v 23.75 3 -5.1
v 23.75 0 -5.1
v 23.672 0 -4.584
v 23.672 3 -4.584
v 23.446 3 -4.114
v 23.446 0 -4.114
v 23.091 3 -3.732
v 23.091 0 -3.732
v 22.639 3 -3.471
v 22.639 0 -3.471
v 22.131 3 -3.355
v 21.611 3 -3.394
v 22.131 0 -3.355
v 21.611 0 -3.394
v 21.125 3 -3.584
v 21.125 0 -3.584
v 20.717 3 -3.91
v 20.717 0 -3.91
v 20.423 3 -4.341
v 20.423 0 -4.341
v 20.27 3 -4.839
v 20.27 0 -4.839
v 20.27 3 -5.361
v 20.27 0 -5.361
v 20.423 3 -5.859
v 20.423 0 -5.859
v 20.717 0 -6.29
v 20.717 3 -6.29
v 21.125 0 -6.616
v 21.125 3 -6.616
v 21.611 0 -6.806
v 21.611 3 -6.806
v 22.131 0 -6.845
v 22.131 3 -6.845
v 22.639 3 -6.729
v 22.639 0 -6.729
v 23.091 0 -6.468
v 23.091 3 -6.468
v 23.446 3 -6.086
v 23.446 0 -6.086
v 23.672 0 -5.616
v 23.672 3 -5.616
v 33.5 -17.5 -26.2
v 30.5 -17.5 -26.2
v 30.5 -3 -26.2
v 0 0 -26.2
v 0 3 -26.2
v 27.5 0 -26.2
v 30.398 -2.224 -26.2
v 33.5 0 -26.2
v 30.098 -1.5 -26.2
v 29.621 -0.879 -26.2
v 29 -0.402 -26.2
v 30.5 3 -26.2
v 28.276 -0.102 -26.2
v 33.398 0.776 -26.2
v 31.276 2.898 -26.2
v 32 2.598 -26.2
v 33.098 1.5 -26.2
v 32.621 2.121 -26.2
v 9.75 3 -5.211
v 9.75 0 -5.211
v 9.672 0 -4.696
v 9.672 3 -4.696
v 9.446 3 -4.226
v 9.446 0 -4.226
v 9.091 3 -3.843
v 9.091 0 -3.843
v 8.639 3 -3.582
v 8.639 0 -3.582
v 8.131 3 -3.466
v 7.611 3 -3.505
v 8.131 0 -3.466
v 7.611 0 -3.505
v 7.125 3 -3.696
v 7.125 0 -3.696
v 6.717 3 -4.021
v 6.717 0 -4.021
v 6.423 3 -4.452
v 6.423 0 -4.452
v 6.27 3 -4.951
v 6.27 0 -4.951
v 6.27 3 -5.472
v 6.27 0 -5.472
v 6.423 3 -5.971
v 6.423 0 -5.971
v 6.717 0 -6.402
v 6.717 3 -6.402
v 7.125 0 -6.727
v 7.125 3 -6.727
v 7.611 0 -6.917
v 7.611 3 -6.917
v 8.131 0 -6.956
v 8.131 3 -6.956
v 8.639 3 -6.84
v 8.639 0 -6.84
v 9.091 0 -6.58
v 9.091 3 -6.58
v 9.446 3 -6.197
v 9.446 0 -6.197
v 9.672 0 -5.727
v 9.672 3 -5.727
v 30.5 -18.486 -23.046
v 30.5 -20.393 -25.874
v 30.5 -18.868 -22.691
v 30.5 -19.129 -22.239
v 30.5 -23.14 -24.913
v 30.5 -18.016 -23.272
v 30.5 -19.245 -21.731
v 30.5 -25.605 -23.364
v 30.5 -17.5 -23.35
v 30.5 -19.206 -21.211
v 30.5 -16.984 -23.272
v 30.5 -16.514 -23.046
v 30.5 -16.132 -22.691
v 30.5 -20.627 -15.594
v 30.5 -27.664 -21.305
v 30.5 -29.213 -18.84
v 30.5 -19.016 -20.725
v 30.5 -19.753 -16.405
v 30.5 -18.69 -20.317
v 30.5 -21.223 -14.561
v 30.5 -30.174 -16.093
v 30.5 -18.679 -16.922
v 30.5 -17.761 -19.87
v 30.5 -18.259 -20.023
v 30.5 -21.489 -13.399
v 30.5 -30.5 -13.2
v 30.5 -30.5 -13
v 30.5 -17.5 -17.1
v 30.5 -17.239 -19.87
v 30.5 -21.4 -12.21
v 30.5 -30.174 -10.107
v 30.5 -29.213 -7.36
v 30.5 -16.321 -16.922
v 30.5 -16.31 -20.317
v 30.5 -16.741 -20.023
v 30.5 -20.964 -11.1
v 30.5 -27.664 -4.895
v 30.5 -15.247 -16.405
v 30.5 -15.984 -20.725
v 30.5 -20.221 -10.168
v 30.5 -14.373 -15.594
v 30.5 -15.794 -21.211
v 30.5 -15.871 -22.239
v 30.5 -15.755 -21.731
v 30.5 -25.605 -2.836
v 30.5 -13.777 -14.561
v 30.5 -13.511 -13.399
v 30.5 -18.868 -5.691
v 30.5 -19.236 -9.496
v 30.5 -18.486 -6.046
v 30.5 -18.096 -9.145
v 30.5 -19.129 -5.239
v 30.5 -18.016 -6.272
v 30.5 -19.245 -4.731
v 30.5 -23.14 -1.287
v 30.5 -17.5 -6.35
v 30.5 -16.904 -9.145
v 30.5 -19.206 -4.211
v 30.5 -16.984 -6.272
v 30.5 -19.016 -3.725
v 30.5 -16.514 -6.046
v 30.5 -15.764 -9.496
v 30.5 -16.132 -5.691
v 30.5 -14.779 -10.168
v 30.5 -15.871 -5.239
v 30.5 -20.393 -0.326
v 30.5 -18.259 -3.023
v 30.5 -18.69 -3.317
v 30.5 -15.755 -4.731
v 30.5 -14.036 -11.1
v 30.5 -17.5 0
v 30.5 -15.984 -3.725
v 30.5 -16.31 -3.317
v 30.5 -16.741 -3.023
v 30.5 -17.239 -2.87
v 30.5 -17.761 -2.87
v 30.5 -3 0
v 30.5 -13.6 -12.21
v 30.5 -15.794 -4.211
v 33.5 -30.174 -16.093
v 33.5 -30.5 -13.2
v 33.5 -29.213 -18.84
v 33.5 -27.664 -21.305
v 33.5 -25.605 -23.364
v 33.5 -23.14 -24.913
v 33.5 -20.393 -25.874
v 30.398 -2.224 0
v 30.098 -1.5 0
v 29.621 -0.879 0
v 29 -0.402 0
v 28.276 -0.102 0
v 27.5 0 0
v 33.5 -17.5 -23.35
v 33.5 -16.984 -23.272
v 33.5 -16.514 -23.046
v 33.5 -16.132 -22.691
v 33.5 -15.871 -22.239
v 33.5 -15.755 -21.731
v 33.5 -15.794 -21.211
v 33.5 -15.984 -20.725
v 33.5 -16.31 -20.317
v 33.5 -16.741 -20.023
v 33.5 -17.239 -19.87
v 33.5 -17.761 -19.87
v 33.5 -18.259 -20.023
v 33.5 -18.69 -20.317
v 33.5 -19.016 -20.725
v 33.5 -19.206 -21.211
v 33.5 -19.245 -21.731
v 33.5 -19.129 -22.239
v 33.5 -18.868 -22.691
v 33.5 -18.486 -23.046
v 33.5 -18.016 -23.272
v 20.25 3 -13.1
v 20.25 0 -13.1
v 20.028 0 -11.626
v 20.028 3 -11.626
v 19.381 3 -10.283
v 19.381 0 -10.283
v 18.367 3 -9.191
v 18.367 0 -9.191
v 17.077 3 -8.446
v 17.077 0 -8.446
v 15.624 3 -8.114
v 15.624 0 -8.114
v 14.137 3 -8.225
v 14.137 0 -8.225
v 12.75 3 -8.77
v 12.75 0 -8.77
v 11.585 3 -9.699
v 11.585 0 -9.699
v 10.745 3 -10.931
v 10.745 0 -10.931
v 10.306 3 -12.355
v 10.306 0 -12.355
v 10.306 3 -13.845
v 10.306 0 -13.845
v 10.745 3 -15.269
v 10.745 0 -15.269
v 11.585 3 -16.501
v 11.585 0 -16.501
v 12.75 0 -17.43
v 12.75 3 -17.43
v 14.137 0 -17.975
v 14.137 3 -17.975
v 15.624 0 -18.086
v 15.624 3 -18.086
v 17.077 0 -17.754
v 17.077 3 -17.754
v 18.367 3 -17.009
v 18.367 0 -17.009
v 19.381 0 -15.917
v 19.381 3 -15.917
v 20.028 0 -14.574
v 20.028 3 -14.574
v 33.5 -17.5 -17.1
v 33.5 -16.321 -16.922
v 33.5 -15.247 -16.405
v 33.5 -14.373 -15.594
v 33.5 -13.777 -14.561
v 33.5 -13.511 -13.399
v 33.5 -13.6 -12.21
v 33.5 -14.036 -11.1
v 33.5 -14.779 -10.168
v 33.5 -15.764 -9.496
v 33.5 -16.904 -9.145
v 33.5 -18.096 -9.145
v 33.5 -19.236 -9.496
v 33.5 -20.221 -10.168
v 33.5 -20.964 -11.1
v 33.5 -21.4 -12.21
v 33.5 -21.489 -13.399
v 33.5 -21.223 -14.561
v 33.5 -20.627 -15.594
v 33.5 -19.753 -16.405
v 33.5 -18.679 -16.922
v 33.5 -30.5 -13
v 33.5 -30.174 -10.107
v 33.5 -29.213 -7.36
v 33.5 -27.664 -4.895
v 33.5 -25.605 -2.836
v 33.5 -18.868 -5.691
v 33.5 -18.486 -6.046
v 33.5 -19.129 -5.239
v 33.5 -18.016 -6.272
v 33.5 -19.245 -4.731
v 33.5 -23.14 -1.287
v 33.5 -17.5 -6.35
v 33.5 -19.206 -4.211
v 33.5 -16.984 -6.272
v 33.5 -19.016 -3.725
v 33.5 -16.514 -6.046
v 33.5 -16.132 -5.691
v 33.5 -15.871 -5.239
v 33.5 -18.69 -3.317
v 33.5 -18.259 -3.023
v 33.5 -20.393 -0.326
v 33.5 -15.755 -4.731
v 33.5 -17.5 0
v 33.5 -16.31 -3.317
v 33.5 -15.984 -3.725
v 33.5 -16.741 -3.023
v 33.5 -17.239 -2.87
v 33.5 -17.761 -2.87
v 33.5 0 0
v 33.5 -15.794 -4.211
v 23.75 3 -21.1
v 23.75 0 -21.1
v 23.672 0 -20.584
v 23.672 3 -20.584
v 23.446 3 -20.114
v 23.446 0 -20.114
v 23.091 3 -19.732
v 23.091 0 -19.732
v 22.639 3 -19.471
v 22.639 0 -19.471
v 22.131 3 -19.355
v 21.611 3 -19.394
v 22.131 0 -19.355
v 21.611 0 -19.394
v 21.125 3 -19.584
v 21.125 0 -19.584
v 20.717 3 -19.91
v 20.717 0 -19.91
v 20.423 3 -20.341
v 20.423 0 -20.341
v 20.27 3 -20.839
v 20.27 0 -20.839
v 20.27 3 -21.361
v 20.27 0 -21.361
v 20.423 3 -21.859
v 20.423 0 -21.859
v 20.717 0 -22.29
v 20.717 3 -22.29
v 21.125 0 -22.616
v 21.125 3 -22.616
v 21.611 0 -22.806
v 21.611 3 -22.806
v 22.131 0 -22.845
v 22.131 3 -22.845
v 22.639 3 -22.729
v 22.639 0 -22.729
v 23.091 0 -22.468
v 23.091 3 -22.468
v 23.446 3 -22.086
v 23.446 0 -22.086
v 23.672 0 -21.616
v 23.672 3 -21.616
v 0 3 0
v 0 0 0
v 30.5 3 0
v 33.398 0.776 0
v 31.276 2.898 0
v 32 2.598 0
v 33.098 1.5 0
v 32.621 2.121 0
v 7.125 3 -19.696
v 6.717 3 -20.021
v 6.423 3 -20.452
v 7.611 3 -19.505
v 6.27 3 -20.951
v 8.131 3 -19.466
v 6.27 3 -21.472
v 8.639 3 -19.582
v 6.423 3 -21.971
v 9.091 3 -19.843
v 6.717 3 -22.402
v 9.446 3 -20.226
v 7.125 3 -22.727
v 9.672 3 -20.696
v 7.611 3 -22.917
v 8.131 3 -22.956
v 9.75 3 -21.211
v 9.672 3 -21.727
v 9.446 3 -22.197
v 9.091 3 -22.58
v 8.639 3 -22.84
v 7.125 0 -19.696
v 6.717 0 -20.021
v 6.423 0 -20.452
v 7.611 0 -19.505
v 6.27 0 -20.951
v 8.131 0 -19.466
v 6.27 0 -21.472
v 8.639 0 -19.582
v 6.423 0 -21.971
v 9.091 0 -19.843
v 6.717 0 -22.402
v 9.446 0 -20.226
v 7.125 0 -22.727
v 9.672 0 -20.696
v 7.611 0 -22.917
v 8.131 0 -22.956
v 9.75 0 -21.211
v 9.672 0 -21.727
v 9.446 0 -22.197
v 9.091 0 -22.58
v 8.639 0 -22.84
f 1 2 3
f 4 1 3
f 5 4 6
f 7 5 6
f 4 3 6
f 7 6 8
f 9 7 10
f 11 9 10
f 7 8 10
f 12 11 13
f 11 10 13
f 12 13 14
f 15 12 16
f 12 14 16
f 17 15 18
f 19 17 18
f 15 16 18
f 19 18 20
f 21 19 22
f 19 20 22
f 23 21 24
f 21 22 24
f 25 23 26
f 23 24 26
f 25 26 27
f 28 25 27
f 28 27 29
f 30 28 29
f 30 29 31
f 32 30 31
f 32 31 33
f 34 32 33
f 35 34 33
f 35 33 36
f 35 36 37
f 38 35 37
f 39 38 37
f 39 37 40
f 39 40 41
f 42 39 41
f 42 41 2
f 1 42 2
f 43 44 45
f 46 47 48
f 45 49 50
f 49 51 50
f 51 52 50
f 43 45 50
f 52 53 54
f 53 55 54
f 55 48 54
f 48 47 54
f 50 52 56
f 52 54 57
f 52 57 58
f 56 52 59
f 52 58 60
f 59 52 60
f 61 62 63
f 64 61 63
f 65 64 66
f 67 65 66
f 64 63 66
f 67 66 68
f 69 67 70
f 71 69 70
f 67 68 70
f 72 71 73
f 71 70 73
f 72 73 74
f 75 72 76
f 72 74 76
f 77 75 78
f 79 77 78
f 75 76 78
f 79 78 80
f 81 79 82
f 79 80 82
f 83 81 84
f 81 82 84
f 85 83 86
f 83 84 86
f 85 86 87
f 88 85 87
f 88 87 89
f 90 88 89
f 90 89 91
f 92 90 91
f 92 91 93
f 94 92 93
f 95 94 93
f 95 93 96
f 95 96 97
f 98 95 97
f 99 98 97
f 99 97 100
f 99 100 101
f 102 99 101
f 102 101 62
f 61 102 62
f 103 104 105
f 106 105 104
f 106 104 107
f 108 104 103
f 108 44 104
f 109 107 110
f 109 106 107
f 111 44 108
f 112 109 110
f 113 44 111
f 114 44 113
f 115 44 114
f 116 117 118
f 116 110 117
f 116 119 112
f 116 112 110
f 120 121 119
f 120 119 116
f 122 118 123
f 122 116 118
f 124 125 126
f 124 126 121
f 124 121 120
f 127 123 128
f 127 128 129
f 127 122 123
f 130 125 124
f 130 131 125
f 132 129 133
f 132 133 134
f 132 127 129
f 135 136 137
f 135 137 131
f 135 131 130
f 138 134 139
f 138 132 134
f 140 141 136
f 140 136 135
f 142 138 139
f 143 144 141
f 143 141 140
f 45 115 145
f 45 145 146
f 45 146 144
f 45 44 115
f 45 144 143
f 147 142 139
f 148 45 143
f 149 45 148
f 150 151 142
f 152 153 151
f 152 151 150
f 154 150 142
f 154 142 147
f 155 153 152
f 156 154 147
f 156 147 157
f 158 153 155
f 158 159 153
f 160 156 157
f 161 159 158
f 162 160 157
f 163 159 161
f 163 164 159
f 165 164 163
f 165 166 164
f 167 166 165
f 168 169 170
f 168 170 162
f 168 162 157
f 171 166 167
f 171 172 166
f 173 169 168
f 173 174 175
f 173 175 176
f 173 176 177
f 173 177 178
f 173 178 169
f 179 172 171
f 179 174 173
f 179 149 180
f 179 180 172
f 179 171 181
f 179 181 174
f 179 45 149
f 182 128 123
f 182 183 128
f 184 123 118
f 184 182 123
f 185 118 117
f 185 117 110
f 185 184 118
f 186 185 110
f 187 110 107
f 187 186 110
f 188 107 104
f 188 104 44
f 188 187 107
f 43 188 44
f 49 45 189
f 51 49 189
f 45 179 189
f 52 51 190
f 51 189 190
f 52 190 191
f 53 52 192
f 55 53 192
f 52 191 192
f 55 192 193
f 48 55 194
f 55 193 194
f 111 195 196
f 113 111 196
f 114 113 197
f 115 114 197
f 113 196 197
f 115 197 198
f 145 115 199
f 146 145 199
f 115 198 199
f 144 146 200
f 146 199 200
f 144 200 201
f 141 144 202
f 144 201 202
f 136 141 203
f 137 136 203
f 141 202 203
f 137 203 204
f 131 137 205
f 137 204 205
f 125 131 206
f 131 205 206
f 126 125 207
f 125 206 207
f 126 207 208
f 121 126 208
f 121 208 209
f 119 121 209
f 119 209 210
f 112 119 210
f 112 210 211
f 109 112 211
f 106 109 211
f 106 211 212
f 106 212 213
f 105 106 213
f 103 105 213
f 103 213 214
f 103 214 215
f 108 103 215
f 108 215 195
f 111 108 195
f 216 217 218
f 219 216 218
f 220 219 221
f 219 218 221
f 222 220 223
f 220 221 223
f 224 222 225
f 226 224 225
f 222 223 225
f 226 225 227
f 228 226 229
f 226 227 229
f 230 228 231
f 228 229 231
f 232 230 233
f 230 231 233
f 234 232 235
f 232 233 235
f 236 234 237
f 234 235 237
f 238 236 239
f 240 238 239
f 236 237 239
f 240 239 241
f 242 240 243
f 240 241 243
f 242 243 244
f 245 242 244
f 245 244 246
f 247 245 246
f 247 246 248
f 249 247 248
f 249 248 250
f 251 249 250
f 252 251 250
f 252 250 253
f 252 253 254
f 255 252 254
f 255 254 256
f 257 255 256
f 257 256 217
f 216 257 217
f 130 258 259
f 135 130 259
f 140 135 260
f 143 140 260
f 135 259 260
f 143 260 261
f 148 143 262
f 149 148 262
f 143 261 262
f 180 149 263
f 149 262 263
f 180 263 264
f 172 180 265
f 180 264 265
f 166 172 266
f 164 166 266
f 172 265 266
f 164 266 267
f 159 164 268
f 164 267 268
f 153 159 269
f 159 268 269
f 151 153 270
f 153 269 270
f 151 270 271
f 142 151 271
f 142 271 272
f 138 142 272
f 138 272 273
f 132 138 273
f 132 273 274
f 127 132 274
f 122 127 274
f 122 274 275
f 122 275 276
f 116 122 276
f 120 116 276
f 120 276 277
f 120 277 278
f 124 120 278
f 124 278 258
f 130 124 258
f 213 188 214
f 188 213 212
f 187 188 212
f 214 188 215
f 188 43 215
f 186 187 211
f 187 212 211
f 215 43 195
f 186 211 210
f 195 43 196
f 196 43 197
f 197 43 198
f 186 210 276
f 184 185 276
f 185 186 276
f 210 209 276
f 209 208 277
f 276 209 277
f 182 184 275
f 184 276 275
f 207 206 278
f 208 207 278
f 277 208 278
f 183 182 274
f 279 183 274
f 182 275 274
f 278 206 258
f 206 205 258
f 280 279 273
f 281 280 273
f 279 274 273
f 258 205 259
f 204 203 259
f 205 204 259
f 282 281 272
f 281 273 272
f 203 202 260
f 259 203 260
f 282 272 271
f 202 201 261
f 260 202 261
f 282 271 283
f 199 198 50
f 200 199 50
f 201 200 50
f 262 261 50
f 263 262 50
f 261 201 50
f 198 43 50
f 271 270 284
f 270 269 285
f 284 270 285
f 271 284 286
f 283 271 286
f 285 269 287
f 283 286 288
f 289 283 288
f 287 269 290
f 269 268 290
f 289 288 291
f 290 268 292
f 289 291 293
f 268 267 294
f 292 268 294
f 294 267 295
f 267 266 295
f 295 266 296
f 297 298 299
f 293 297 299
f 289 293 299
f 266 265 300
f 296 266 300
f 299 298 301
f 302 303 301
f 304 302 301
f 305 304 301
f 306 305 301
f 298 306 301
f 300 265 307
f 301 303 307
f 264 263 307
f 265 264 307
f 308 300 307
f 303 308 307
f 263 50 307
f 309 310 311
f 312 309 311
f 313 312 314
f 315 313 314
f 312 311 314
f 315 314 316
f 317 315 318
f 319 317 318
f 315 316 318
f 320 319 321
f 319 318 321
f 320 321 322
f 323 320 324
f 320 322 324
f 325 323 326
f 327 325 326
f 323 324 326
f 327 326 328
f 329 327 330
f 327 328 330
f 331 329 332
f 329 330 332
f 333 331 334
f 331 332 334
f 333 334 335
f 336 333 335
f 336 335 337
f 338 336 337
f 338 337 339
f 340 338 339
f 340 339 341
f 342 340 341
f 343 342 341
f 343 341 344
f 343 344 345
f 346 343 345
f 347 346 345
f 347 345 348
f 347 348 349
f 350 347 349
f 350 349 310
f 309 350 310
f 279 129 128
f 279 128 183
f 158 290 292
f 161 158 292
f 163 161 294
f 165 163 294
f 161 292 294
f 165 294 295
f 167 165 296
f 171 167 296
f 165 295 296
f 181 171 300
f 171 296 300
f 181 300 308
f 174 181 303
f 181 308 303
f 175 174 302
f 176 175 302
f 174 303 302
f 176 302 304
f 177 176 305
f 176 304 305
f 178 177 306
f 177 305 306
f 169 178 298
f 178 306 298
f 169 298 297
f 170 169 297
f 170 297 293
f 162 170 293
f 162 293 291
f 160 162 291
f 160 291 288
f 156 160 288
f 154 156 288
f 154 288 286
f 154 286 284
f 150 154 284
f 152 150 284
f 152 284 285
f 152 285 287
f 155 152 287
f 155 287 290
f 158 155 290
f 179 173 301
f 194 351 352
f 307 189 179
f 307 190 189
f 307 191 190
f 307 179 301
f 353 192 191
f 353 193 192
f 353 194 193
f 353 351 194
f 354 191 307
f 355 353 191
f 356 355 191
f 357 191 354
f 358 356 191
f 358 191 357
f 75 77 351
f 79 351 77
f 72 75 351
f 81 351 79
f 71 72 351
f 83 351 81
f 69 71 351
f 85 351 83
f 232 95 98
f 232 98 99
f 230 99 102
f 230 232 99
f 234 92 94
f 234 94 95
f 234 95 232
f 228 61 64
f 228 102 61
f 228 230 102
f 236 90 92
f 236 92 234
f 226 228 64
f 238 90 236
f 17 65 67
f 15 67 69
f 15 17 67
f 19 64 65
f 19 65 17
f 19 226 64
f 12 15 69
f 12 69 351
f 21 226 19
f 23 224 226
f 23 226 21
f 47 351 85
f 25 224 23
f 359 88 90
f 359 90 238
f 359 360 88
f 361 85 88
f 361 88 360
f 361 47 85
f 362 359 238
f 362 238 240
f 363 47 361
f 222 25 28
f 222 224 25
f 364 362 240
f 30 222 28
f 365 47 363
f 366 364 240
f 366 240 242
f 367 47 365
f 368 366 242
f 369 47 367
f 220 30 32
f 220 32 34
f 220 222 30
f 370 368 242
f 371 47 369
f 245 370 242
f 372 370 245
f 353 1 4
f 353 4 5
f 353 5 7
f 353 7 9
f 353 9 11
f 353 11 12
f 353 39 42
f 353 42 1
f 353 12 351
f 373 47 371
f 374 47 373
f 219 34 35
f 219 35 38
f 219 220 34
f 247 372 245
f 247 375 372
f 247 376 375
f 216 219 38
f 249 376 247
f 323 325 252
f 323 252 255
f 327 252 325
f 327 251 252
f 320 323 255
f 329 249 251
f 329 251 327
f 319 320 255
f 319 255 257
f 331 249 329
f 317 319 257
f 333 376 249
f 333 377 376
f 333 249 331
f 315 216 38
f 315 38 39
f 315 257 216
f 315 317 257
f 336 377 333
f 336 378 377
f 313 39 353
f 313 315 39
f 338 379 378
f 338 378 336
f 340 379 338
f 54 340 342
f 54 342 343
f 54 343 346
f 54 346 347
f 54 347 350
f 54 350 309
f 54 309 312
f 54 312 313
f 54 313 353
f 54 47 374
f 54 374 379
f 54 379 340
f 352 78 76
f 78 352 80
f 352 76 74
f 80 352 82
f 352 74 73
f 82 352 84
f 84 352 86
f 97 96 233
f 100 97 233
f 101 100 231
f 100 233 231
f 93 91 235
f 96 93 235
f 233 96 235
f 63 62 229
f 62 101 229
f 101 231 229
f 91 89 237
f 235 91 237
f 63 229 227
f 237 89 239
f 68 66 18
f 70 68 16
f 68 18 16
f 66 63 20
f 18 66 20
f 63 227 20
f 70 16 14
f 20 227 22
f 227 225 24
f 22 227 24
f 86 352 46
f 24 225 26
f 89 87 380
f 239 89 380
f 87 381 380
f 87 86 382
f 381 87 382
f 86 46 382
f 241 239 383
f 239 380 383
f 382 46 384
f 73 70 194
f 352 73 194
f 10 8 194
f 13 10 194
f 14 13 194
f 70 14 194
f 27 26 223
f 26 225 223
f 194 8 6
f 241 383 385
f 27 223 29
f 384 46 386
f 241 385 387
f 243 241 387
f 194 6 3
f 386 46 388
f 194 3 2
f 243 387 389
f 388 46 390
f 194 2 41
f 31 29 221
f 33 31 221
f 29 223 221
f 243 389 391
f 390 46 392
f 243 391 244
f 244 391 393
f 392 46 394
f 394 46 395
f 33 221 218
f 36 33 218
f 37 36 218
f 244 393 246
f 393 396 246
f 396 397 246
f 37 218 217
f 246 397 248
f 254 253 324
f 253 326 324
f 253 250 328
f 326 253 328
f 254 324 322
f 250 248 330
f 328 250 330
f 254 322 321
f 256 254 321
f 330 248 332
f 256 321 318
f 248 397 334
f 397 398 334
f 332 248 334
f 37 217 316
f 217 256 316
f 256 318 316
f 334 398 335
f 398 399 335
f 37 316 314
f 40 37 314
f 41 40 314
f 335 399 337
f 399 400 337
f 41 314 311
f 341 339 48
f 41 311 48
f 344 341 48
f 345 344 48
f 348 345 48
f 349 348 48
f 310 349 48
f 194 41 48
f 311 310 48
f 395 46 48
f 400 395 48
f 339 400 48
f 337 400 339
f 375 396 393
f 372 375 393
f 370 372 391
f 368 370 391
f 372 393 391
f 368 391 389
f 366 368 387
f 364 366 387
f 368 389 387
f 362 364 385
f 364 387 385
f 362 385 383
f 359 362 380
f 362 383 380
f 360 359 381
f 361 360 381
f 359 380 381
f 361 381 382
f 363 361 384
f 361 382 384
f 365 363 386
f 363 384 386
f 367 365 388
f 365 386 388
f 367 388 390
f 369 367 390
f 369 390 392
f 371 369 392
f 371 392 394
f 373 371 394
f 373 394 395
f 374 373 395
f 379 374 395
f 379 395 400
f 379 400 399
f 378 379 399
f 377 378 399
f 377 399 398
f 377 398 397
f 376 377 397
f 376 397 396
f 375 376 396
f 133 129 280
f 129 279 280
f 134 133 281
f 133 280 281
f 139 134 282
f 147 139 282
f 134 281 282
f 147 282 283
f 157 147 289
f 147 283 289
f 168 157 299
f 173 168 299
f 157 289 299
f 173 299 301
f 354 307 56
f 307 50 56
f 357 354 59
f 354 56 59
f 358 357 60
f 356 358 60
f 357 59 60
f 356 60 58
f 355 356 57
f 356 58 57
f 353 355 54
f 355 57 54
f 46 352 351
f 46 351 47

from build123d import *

# Parameters (mm, degrees)
SKETCH1_W               = 33.5
SKETCH1_H               = 26.2
BOSS_EXTRUDE1_DEPTH     = 3
SKETCH3_W               = 3
SKETCH3_H               = 26.2
BOSS_EXTRUDE3_DEPTH     = 30.5
FILLET1_R               = 13
SKETCH7_R               = 1.75
SKETCH7_R_2             = 5
CUT_EXTRUDE1_DEPTH      = 4
FILLET2_R               = 3
SKETCH10_R              = 1.75
SKETCH10_R_2            = 4
CUT_EXTRUDE2_DEPTH      = 1
CUT_EXTRUDE2_DEPTH_BACK = 3.5


with BuildPart() as part:
    # Sketch1 → Boss-Extrude1 (new body)
    with BuildSketch(Plane(origin=(0, 0, 0), x_dir=(1, 0, 0), z_dir=(0, 1, 0))):
        with Locations((16.75, 13.1)):
            Rectangle(SKETCH1_W, SKETCH1_H)
    extrude(amount=BOSS_EXTRUDE1_DEPTH)

    # Sketch3 → Boss-Extrude3 (add)
    with BuildSketch(Plane.XZ):
        with Locations((32, -13.1)):
            Rectangle(SKETCH3_W, SKETCH3_H)
    extrude(amount=BOSS_EXTRUDE3_DEPTH)

    # Fillet1
    fillet1_edges = [part.edges().sort_by_distance(p)[0] for p in [
        (32, -30.5, -26.2),
        (32, -30.5, 0),
    ]]
    fillet(fillet1_edges, radius=FILLET1_R)

    # Sketch7 → Cut-Extrude1 (cut, through all)
    with BuildSketch(Plane.XZ):
        with Locations((8, -5.211347336)):
            Circle(SKETCH7_R)
        with Locations((8, -21.211347336)):
            Circle(SKETCH7_R)
        with Locations((22, -21.1)):
            Circle(SKETCH7_R)
        with Locations((22, -5.1)):
            Circle(SKETCH7_R)
        with Locations((15.25, -13.1)):
            Circle(SKETCH7_R_2)
    extrude(amount=-CUT_EXTRUDE1_DEPTH, mode=Mode.SUBTRACT)

    # Fillet2
    fillet2_edges = [part.edges().sort_by_distance(p)[0] for p in [
        (33.5, 3, -13.1),
        (30.5, 0, -13.1),
    ]]
    fillet(fillet2_edges, radius=FILLET2_R)

    # Sketch10 → Cut-Extrude2 (cut, two sides)
    with BuildSketch(Plane(origin=(33.5, 0, 0), x_dir=(0, 0, -1), z_dir=(1, 0, 0))) as cut_extrude2_sk:
        with Locations((4.6, -17.5)):
            Circle(SKETCH10_R)
        with Locations((21.6, -17.5)):
            Circle(SKETCH10_R)
        with Locations((13.1, -17.5)):
            Circle(SKETCH10_R_2)
    extrude(amount=CUT_EXTRUDE2_DEPTH, mode=Mode.SUBTRACT)
    extrude(cut_extrude2_sk.sketch, amount=-CUT_EXTRUDE2_DEPTH_BACK, mode=Mode.SUBTRACT)


solid = part.part
